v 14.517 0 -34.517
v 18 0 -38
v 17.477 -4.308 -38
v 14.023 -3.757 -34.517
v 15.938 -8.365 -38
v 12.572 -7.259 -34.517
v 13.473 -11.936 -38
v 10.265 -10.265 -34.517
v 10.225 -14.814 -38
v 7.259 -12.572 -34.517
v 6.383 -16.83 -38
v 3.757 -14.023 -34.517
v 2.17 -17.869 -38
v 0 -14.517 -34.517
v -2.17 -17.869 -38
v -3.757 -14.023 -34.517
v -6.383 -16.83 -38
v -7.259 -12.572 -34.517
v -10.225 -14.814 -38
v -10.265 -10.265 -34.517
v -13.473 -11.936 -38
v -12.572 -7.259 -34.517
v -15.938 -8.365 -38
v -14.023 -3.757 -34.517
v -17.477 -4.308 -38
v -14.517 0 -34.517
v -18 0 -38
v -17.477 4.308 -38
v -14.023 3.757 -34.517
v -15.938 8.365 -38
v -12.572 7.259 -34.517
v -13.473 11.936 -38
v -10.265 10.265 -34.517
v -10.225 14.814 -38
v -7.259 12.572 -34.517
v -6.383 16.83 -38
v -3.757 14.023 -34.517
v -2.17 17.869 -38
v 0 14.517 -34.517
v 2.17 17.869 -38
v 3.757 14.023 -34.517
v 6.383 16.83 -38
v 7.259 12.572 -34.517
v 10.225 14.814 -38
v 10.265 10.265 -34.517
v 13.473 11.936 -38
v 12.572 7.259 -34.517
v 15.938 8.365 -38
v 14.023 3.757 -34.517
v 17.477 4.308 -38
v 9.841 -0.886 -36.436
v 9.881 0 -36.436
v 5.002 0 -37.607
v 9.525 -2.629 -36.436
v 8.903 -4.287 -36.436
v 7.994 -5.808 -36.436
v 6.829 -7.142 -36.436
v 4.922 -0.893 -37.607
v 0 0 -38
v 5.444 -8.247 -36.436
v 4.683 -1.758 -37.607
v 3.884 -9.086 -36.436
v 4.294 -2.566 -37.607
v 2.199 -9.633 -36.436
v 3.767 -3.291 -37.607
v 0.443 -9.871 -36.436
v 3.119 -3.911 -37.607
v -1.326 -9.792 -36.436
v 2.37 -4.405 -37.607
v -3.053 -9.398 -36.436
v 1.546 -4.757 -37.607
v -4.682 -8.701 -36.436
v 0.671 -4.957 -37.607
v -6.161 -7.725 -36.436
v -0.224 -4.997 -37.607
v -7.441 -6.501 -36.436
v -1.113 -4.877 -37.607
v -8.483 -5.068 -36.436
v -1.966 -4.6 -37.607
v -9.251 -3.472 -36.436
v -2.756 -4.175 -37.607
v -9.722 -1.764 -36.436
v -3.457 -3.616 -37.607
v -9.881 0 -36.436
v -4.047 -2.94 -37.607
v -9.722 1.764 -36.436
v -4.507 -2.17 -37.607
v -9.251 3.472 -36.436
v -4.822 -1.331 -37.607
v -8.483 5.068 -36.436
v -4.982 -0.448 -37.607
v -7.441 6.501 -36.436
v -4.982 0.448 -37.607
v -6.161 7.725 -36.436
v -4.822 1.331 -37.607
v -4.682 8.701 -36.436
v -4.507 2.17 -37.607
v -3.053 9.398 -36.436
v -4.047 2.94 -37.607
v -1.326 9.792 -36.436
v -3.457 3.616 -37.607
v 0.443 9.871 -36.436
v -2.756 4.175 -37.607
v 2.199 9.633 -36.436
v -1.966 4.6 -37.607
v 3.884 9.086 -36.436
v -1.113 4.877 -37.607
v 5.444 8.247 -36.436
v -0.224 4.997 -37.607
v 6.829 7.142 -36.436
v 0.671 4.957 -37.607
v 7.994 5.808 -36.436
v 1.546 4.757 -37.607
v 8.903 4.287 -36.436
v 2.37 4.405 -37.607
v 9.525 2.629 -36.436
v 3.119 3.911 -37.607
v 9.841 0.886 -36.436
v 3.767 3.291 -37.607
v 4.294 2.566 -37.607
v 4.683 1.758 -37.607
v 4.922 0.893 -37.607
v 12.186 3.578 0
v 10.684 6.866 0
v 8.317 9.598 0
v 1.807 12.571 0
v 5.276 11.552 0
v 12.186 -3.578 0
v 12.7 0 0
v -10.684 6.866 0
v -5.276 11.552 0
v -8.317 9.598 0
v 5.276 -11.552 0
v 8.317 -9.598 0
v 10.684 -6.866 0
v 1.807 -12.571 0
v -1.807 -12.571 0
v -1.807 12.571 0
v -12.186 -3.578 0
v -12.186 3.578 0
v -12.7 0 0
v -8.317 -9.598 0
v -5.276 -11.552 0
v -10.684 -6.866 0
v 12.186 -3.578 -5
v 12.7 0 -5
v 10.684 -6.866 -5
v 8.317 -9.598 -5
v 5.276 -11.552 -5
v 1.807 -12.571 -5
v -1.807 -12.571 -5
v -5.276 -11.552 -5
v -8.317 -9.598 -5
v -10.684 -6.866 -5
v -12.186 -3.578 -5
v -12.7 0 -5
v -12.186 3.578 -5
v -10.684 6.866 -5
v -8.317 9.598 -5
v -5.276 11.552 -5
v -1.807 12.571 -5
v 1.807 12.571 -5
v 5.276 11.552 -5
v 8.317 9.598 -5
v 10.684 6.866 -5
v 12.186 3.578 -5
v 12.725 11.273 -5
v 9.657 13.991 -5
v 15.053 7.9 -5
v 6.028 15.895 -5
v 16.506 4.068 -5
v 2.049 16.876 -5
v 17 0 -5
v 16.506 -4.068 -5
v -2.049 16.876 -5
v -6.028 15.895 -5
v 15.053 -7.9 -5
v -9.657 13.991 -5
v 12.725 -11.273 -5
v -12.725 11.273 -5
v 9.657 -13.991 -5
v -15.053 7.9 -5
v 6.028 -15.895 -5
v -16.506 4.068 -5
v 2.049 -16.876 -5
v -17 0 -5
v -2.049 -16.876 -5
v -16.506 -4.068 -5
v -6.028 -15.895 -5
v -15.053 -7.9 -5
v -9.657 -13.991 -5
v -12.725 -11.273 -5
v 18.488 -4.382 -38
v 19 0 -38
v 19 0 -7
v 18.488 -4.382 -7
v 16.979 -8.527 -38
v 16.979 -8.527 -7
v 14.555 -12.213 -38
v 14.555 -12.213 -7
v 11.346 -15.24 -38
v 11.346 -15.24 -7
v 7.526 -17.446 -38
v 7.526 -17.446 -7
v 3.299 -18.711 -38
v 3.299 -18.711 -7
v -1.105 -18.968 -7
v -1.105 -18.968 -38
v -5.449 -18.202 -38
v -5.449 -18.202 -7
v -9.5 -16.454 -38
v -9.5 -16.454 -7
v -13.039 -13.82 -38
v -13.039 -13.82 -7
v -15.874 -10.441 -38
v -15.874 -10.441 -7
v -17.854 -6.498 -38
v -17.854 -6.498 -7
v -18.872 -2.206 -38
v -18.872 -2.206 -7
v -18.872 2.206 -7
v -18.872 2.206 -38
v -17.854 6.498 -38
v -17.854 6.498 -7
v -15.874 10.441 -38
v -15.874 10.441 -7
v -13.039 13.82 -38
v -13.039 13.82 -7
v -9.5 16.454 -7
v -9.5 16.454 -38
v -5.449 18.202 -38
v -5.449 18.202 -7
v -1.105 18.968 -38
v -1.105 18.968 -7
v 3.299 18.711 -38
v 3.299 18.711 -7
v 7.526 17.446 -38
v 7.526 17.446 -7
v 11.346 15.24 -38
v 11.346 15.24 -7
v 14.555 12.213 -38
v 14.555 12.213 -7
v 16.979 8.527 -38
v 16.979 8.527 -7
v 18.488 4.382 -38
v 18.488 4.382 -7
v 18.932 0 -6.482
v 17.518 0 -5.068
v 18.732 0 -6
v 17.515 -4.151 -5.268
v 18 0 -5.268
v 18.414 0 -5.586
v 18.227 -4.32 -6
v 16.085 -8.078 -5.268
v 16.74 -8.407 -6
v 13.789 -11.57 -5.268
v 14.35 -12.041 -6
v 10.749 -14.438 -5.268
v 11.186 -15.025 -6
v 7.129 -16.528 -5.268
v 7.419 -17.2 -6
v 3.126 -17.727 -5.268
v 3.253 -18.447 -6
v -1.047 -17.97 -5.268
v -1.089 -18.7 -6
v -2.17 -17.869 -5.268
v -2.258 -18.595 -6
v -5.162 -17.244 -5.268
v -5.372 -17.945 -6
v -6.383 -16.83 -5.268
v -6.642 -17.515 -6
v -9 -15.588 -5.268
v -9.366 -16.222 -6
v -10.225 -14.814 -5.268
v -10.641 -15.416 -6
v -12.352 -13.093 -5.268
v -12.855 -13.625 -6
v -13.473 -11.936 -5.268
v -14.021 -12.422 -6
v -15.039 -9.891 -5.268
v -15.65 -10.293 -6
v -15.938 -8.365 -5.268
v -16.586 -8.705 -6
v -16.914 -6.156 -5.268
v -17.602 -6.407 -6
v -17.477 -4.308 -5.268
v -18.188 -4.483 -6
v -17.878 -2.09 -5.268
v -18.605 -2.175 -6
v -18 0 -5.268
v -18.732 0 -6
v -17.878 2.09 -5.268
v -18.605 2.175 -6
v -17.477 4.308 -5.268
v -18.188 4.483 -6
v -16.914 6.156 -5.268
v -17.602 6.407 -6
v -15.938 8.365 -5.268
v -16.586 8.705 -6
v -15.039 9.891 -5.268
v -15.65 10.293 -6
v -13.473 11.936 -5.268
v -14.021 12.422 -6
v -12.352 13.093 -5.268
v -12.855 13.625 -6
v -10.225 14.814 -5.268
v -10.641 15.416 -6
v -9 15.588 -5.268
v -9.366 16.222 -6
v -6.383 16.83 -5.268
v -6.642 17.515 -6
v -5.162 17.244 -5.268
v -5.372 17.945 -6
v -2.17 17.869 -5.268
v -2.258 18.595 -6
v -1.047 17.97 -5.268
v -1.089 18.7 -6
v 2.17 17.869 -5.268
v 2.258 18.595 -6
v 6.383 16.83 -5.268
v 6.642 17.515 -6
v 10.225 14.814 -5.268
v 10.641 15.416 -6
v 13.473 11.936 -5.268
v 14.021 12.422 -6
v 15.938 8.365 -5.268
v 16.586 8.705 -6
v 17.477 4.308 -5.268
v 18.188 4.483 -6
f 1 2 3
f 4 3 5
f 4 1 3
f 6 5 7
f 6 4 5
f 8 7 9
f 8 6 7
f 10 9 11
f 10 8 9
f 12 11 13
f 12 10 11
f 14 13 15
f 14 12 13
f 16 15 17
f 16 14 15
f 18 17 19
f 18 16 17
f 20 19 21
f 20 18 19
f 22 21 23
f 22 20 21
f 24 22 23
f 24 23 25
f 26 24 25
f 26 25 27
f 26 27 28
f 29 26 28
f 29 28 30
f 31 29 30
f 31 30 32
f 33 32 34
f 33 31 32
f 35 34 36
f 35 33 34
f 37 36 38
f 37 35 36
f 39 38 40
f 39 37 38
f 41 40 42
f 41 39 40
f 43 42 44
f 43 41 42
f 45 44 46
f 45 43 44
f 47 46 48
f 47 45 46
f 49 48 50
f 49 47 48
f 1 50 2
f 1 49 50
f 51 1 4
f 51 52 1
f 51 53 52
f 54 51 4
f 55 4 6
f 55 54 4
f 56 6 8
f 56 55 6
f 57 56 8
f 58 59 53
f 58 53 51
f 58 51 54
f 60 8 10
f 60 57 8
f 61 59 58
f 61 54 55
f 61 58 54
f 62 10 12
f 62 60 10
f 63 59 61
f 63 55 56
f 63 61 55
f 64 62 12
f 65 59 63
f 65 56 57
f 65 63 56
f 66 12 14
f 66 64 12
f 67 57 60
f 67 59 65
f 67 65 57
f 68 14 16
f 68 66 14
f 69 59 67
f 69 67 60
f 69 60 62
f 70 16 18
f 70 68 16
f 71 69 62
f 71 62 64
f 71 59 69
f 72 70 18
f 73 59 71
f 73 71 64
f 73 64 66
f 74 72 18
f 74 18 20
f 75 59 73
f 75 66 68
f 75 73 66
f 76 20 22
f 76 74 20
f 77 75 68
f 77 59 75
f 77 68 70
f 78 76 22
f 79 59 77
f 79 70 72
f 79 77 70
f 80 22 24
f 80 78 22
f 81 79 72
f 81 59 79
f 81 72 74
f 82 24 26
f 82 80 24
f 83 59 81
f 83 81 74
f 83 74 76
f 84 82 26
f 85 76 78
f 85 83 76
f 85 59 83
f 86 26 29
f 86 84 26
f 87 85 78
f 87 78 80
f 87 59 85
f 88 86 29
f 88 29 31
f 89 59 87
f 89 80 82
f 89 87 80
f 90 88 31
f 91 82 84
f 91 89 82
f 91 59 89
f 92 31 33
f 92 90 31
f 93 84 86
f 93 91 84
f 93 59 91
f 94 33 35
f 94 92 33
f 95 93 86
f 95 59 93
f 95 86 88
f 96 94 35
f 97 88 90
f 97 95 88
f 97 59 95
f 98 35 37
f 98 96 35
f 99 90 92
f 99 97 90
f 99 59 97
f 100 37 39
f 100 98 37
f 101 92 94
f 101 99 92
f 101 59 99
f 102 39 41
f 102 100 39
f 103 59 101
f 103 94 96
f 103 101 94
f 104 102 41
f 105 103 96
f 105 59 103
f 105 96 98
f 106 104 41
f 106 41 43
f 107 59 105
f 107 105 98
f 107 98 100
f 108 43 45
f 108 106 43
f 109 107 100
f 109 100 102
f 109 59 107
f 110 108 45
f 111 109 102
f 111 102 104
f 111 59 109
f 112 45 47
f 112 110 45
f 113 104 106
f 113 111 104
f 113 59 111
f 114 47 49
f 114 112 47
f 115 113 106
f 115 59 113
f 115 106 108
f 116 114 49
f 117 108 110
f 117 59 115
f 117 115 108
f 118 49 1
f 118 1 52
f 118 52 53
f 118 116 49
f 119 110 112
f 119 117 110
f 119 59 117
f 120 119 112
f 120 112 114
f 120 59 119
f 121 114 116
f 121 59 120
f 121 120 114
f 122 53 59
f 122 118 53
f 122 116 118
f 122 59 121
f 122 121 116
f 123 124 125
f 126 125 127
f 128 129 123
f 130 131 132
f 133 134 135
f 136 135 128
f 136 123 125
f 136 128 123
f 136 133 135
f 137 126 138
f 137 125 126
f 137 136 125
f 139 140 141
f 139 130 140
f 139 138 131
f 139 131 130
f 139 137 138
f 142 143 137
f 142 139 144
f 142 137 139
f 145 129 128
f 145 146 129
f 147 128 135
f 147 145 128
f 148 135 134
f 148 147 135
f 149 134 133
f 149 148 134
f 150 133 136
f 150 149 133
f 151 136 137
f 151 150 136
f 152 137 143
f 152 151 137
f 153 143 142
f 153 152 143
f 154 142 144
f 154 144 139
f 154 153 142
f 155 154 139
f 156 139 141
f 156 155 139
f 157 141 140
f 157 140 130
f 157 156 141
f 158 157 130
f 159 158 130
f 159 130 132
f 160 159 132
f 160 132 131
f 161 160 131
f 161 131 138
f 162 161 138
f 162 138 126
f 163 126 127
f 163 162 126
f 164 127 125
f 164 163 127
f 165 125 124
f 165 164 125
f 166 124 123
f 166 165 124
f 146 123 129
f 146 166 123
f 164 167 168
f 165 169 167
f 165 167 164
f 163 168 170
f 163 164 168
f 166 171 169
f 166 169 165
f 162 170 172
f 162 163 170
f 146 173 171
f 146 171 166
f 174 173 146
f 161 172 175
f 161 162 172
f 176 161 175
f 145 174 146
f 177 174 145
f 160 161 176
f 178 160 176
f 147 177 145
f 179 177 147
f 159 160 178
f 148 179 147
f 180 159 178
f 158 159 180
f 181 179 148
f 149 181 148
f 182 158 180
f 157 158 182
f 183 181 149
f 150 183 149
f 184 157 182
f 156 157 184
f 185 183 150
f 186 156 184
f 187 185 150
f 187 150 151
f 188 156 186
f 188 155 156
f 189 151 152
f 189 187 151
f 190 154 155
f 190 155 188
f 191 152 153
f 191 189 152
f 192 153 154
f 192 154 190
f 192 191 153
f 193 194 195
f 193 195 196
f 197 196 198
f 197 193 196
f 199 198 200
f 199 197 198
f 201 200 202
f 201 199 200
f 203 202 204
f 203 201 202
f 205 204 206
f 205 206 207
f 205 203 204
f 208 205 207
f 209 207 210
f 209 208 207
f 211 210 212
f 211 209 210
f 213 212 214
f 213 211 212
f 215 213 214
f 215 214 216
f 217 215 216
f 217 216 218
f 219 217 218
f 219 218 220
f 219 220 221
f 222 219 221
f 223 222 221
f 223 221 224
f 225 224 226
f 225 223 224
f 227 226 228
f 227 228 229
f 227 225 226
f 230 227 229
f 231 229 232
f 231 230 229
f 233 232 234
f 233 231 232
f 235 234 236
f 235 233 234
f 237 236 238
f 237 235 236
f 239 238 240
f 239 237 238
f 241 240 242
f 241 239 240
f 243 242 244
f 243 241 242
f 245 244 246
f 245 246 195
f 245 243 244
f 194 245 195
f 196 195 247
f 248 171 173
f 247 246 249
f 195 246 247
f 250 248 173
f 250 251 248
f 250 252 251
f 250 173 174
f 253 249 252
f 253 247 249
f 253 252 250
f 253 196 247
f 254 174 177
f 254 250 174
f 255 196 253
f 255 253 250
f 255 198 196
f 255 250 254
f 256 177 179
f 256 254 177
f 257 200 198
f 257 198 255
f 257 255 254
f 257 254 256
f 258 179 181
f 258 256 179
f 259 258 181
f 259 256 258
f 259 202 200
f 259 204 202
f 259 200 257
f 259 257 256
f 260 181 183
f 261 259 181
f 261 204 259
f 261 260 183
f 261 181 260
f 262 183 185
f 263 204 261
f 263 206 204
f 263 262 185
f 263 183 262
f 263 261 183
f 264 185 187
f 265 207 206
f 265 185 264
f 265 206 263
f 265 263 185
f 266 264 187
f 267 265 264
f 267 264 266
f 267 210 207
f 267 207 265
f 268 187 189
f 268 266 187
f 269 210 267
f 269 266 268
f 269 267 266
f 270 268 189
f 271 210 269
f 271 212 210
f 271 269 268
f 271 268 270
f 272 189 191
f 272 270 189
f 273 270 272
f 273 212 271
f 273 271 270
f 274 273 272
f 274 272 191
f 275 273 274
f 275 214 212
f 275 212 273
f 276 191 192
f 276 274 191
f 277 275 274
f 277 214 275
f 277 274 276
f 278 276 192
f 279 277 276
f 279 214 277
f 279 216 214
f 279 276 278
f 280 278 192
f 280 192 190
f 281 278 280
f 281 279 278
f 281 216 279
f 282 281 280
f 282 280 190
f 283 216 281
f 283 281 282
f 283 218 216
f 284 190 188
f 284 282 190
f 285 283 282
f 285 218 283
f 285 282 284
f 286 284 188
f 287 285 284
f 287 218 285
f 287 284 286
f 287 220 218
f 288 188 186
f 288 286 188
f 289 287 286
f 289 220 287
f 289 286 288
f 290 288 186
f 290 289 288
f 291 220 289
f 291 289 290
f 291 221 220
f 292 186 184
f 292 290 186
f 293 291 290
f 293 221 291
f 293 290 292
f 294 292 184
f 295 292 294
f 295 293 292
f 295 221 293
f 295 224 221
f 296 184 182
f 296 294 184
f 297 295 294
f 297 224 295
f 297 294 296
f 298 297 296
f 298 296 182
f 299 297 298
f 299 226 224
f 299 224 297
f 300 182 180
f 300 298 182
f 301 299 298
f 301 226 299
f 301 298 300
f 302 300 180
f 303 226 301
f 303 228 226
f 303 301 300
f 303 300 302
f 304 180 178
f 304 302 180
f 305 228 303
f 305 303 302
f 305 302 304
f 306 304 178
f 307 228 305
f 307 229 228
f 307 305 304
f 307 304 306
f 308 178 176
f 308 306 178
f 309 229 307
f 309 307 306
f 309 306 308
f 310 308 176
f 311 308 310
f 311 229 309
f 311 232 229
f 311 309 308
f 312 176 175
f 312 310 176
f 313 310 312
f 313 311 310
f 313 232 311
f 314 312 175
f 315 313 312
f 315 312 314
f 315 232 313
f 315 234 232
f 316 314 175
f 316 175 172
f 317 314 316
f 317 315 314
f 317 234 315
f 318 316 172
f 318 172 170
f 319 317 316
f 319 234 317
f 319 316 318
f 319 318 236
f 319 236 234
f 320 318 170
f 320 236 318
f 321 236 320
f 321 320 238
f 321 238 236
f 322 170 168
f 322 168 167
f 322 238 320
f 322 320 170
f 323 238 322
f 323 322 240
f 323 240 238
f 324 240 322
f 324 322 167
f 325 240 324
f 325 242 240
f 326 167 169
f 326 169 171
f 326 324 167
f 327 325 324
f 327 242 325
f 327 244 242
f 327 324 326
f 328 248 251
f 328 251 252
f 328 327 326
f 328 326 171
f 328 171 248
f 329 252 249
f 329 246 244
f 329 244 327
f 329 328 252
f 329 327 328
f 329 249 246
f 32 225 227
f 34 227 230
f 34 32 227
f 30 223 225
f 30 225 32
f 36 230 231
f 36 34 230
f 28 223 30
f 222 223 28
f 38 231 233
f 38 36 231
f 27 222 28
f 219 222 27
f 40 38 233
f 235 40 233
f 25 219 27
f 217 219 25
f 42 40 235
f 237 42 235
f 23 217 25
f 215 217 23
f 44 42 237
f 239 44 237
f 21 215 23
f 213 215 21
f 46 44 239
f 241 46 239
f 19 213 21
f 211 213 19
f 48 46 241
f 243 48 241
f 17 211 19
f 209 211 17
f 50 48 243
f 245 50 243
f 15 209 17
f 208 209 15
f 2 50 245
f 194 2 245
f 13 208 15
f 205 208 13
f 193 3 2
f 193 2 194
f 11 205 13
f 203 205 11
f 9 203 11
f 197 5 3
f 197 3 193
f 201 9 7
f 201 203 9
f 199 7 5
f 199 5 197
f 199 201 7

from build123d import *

# Parameters (mm, degrees)
FILLET1_R = 2


with BuildPart() as part:
    # Sketch1 → Revolve1 (revolve)
    with BuildSketch(Plane(origin=(0, 0, 0), x_dir=(0, 0, -1), z_dir=(1, 0, 0)), mode=Mode.PRIVATE) as revolve1_sk:
        with BuildLine():
            Line((0, 0), (0, -12.7))
            Line((0, -12.7), (5, -12.7))
            Line((5, -12.7), (5, -19))
            Line((5, -19), (38, -19))
            Line((38, -19), (38, -18))
            Line((38, -18), (34.517434791, -14.517434791))
            ThreePointArc((34.517434791, -14.517434791), (37.117181053, -7.464652928), (38, 0))
            Line((38, 0), (6, 0))
            Line((6, 0), (0, 0))
        make_face()
    revolve(revolve1_sk.sketch.rotate(Axis((0, 0, 0), (0, 0, -1)), 270), axis=Axis((0, 0, 0), (0, 0, -1)))

    # Fillet1
    fillet1_edges = [part.edges().sort_by_distance(p)[0] for p in [
        (-19, 0, -5),
    ]]
    fillet(fillet1_edges, radius=FILLET1_R)


solid = part.part
